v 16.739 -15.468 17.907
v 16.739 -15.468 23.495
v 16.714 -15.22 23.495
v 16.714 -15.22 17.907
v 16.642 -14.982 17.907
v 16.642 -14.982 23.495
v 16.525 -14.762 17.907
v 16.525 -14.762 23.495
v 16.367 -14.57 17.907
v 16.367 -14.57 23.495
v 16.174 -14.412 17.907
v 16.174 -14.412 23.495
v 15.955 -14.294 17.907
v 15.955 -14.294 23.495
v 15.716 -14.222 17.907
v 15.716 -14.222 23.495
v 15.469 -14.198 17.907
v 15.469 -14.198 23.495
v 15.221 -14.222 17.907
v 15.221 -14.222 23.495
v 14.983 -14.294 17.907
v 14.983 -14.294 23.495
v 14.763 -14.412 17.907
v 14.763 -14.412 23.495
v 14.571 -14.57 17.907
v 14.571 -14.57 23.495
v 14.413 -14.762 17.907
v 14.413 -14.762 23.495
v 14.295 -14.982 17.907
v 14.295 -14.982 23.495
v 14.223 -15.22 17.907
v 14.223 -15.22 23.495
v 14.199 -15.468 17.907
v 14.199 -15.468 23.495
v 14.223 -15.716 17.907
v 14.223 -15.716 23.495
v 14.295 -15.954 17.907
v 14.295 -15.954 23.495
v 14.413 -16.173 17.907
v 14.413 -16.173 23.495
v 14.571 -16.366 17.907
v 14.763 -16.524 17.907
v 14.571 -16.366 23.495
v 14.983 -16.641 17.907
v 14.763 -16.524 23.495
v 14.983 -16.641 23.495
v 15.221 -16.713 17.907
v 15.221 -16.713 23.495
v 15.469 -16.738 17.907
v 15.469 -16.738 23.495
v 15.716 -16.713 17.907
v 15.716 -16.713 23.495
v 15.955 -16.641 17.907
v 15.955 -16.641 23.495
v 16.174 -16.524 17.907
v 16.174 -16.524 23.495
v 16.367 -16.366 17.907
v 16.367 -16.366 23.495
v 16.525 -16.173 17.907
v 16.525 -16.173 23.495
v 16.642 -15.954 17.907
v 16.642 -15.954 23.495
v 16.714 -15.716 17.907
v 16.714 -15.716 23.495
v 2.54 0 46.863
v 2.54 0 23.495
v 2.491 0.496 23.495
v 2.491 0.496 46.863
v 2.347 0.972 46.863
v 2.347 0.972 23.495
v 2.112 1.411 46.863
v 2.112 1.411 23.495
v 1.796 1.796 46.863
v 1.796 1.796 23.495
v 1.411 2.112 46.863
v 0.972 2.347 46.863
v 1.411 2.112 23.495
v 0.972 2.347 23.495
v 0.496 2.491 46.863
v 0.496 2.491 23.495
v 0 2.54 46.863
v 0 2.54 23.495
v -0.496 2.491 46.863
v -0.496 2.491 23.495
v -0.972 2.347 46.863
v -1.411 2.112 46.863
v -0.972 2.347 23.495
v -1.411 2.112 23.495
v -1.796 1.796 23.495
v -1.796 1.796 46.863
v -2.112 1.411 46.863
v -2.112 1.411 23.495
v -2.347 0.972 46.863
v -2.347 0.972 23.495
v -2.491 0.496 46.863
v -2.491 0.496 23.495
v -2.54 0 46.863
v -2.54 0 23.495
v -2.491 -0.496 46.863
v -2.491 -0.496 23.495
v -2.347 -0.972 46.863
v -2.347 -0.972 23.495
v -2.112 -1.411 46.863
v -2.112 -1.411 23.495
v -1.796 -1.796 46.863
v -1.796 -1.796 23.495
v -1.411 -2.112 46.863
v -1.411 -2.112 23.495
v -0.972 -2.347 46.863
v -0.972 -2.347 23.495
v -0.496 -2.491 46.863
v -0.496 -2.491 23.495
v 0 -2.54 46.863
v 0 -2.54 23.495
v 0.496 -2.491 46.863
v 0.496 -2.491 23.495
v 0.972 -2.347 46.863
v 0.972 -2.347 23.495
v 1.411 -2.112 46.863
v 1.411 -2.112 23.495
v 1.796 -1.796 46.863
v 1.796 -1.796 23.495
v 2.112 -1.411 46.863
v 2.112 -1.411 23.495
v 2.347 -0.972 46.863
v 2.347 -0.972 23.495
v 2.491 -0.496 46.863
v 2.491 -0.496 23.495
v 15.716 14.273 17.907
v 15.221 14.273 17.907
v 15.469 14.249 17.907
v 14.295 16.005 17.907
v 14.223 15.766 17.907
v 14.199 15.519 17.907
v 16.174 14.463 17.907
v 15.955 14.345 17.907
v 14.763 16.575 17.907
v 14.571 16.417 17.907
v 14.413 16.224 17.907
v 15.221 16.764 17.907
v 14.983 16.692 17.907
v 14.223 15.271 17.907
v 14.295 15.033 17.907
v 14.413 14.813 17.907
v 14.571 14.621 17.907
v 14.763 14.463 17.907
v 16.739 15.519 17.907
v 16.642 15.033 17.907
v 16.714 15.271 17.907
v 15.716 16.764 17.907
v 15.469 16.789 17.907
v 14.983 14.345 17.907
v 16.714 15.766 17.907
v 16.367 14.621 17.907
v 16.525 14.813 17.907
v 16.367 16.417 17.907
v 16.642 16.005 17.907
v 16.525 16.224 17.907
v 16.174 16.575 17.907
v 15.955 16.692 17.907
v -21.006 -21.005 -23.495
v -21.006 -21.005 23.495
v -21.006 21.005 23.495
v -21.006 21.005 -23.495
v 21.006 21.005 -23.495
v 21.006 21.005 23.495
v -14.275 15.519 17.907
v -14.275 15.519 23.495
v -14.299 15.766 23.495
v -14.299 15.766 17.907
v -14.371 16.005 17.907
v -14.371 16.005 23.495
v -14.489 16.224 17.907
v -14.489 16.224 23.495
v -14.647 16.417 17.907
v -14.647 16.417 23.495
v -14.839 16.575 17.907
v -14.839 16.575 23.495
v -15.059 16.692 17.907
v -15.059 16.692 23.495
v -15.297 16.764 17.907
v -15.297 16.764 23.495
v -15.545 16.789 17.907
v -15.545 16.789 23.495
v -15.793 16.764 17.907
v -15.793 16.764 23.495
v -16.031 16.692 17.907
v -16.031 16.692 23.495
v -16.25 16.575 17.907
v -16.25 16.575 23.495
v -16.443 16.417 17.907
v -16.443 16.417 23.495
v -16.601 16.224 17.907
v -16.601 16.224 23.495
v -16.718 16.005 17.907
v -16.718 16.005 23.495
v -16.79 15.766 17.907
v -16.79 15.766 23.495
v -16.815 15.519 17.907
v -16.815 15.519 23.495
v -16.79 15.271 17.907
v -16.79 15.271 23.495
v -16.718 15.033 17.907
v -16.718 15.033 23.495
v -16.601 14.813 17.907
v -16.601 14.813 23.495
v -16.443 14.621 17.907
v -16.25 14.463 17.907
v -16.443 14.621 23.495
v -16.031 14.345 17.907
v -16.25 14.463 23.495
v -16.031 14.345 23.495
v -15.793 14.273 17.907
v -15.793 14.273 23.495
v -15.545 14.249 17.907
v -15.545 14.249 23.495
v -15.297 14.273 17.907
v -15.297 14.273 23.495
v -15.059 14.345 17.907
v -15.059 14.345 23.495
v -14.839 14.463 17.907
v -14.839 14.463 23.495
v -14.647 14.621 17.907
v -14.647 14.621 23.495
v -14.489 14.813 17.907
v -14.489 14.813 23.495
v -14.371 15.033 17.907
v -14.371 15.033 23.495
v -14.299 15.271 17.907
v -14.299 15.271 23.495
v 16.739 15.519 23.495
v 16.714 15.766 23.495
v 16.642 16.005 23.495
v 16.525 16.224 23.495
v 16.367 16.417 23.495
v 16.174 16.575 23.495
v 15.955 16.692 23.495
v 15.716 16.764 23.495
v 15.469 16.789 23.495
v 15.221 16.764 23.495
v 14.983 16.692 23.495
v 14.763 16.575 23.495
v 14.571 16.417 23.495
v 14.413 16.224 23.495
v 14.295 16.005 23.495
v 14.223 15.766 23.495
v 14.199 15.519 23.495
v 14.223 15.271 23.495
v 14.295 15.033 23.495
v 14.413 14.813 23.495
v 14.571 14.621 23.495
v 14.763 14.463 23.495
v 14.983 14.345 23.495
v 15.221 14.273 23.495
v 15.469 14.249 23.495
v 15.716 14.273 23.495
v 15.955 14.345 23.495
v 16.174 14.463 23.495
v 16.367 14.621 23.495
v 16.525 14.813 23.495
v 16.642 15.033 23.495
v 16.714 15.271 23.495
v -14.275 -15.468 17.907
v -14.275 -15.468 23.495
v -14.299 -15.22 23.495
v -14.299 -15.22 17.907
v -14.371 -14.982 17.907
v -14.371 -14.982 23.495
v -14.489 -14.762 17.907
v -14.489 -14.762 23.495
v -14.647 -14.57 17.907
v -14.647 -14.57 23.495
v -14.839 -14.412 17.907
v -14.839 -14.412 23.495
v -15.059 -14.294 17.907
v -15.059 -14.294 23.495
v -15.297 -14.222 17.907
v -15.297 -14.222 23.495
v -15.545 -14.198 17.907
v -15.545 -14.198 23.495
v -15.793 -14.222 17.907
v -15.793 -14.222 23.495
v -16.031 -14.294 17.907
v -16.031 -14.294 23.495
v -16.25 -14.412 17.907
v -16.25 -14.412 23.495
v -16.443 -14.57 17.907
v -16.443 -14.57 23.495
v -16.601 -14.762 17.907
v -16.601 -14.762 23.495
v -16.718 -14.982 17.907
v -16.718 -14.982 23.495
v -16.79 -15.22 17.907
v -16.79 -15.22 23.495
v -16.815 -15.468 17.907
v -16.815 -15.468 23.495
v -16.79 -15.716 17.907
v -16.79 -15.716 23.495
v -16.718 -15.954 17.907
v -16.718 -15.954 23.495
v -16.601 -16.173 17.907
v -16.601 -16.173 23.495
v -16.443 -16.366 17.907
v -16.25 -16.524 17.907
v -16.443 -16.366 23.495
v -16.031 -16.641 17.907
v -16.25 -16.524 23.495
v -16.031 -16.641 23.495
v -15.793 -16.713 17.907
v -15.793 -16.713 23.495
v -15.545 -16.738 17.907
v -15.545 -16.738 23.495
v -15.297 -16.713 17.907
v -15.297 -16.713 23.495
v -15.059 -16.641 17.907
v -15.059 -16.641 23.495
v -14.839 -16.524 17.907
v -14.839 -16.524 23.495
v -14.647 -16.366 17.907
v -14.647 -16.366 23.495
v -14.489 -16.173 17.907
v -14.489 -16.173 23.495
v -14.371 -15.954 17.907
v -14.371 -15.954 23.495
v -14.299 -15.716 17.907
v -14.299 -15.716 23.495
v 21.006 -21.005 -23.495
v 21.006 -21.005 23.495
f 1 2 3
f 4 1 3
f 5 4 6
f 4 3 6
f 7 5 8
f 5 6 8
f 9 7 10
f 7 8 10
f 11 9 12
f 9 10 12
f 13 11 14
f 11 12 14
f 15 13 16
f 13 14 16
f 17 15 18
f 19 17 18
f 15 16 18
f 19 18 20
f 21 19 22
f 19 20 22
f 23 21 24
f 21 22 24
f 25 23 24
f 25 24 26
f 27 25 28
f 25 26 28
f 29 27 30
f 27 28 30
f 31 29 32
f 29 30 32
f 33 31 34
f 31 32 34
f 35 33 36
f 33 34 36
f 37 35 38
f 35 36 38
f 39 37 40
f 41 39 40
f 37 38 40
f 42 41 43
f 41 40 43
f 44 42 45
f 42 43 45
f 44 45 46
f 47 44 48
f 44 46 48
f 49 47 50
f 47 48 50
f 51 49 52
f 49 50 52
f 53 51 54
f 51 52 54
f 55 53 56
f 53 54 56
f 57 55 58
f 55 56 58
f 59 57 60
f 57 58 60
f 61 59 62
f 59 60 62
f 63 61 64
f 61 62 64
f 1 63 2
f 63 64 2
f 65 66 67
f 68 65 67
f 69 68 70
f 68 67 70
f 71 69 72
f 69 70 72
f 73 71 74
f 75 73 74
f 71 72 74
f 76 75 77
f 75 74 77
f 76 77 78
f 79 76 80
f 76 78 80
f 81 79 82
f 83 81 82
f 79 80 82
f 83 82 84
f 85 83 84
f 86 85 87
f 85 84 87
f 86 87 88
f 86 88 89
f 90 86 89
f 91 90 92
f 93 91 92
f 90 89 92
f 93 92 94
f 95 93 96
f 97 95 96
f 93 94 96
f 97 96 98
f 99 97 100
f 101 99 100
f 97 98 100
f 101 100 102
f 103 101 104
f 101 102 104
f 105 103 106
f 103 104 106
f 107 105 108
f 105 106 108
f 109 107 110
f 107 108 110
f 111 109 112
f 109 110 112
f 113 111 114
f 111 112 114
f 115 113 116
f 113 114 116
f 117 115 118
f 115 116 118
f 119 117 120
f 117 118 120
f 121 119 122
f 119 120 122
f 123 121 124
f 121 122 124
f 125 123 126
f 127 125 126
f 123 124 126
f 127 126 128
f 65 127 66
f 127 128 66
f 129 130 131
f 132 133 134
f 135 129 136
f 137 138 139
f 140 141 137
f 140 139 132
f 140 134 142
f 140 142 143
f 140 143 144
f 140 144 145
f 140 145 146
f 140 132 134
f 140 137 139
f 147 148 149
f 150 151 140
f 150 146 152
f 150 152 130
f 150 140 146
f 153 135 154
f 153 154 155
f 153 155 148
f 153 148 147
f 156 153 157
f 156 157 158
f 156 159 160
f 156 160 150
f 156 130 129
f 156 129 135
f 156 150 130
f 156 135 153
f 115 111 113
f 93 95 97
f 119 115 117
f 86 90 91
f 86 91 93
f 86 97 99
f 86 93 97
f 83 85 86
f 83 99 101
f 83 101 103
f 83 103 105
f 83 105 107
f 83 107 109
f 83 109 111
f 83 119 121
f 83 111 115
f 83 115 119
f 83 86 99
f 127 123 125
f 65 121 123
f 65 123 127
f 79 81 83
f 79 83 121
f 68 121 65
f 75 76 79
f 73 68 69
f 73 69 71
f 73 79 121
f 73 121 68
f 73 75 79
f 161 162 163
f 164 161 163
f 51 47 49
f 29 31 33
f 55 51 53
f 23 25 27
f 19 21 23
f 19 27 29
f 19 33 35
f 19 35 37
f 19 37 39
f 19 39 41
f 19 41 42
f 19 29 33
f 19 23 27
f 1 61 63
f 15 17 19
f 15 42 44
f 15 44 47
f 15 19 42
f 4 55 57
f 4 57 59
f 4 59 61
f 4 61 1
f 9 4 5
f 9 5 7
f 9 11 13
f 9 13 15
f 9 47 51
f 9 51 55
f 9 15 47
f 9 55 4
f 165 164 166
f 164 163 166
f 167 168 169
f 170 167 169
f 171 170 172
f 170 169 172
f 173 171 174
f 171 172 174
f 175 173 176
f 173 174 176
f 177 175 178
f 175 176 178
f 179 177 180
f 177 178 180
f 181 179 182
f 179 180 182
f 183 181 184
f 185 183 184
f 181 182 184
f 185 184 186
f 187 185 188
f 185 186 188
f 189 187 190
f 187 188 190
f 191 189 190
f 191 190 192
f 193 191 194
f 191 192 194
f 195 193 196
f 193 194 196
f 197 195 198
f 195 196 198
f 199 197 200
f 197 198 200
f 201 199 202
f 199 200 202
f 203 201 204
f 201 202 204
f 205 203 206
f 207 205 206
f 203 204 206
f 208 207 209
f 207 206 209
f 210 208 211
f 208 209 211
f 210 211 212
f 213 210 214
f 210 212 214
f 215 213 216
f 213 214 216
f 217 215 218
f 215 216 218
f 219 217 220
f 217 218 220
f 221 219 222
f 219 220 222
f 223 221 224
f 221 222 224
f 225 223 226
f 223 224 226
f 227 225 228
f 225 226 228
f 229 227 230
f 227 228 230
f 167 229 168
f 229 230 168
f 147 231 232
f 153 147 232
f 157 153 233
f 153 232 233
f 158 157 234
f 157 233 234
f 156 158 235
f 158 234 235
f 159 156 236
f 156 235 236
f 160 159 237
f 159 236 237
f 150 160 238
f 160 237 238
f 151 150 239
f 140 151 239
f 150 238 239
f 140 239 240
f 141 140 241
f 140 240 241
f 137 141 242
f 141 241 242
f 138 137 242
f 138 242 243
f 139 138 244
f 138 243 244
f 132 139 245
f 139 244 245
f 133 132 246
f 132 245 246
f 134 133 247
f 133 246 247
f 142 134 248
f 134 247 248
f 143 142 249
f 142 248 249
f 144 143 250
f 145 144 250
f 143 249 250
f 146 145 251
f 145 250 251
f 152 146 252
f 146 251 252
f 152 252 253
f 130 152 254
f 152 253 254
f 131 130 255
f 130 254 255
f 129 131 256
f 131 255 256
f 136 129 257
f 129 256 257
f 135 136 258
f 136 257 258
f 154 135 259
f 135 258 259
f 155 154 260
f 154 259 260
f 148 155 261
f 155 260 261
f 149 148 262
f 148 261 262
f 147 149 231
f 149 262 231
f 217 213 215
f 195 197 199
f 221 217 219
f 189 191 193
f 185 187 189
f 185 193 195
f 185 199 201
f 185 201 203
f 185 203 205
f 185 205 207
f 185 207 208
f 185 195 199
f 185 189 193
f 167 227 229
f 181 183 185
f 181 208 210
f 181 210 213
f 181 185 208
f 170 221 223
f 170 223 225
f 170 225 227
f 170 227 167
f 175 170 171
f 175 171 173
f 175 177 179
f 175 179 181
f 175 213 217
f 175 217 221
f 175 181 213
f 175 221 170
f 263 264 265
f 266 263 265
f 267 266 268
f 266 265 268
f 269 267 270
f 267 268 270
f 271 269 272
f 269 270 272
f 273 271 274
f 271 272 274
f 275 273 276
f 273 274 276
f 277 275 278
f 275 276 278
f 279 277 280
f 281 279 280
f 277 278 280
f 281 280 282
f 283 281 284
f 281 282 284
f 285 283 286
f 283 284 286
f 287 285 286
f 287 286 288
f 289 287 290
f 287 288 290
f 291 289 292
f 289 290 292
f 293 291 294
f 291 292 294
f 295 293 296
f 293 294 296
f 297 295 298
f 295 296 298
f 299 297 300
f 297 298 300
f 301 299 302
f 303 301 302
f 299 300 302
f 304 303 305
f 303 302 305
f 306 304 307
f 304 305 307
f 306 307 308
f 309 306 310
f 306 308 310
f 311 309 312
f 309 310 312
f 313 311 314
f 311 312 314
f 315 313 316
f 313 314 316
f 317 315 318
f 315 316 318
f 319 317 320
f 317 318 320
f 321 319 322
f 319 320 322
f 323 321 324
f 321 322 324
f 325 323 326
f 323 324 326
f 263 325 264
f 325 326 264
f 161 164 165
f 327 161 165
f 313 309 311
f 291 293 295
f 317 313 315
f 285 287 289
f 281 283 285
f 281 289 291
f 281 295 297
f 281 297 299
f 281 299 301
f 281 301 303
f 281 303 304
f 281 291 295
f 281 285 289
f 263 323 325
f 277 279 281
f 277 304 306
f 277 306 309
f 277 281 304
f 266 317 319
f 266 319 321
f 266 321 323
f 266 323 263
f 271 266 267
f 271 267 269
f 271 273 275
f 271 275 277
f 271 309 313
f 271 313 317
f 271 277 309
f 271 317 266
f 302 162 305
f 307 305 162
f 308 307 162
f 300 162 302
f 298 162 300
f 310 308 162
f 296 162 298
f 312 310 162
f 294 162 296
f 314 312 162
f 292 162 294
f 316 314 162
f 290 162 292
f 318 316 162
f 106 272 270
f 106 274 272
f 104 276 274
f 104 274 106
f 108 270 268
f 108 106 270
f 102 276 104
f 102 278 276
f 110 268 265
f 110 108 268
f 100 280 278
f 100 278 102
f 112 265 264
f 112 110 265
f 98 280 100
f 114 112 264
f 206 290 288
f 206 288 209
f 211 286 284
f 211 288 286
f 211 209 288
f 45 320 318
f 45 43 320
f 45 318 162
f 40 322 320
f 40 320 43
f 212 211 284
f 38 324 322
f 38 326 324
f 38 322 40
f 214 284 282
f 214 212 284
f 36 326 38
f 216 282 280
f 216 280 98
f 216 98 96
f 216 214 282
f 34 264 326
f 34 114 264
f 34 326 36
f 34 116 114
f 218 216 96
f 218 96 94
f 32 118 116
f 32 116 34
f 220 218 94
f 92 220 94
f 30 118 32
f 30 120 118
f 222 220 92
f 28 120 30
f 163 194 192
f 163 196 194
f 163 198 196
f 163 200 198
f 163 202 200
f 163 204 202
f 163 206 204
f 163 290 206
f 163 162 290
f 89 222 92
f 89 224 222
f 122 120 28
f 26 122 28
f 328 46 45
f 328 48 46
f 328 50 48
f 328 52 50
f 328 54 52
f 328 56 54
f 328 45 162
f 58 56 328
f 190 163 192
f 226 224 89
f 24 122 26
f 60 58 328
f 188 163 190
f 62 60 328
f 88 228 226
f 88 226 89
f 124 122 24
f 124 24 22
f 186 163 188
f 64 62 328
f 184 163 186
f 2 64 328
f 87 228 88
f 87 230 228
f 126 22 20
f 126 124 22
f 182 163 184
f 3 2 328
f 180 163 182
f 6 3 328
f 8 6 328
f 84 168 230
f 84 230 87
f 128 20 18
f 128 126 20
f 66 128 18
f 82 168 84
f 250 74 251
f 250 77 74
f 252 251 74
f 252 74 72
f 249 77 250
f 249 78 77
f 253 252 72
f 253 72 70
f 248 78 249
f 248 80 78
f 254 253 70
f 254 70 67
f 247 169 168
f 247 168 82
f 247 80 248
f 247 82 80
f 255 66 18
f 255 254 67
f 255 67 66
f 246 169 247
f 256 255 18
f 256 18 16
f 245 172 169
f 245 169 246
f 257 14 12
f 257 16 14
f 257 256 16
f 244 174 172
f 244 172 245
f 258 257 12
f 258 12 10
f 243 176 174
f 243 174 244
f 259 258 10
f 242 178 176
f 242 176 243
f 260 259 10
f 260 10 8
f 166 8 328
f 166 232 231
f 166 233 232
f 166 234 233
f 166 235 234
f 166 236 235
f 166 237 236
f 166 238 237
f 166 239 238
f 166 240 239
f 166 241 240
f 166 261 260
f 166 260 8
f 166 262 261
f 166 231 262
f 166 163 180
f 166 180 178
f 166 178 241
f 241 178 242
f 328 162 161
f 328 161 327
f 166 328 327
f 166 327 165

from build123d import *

# Parameters (mm, degrees)
SKETCH1_W           = 42.0116
SKETCH1_H           = 42.01
BOSS_EXTRUDE1_DEPTH = 23.495
SKETCH2_R           = 2.54
BOSS_EXTRUDE2_DEPTH = 23.368
SKETCH3_R           = 1.27
CUT_EXTRUDE1_DEPTH  = 5.588


with BuildPart() as part:
    # Sketch1 → Boss-Extrude1 (new, symmetric)
    with BuildSketch(Plane.XY):
        Rectangle(SKETCH1_W, SKETCH1_H)
    extrude(amount=BOSS_EXTRUDE1_DEPTH, both=True)

    # Sketch2 → Boss-Extrude2 (add)
    with BuildSketch(Plane.XY.offset(23.495)):
        Circle(SKETCH2_R)
    extrude(amount=BOSS_EXTRUDE2_DEPTH)

    # Sketch3 → Cut-Extrude1 (cut)
    with BuildSketch(Plane.XY.offset(23.495)):
        with Locations((15.4686, -15.4678)):
            Circle(SKETCH3_R)
        with Locations((-15.5448, 15.5186)):
            Circle(SKETCH3_R)
        with Locations((15.4686, 15.5186)):
            Circle(SKETCH3_R)
        with Locations((-15.5448, -15.4678)):
            Circle(SKETCH3_R)
    extrude(amount=-CUT_EXTRUDE1_DEPTH, mode=Mode.SUBTRACT)


solid = part.part
